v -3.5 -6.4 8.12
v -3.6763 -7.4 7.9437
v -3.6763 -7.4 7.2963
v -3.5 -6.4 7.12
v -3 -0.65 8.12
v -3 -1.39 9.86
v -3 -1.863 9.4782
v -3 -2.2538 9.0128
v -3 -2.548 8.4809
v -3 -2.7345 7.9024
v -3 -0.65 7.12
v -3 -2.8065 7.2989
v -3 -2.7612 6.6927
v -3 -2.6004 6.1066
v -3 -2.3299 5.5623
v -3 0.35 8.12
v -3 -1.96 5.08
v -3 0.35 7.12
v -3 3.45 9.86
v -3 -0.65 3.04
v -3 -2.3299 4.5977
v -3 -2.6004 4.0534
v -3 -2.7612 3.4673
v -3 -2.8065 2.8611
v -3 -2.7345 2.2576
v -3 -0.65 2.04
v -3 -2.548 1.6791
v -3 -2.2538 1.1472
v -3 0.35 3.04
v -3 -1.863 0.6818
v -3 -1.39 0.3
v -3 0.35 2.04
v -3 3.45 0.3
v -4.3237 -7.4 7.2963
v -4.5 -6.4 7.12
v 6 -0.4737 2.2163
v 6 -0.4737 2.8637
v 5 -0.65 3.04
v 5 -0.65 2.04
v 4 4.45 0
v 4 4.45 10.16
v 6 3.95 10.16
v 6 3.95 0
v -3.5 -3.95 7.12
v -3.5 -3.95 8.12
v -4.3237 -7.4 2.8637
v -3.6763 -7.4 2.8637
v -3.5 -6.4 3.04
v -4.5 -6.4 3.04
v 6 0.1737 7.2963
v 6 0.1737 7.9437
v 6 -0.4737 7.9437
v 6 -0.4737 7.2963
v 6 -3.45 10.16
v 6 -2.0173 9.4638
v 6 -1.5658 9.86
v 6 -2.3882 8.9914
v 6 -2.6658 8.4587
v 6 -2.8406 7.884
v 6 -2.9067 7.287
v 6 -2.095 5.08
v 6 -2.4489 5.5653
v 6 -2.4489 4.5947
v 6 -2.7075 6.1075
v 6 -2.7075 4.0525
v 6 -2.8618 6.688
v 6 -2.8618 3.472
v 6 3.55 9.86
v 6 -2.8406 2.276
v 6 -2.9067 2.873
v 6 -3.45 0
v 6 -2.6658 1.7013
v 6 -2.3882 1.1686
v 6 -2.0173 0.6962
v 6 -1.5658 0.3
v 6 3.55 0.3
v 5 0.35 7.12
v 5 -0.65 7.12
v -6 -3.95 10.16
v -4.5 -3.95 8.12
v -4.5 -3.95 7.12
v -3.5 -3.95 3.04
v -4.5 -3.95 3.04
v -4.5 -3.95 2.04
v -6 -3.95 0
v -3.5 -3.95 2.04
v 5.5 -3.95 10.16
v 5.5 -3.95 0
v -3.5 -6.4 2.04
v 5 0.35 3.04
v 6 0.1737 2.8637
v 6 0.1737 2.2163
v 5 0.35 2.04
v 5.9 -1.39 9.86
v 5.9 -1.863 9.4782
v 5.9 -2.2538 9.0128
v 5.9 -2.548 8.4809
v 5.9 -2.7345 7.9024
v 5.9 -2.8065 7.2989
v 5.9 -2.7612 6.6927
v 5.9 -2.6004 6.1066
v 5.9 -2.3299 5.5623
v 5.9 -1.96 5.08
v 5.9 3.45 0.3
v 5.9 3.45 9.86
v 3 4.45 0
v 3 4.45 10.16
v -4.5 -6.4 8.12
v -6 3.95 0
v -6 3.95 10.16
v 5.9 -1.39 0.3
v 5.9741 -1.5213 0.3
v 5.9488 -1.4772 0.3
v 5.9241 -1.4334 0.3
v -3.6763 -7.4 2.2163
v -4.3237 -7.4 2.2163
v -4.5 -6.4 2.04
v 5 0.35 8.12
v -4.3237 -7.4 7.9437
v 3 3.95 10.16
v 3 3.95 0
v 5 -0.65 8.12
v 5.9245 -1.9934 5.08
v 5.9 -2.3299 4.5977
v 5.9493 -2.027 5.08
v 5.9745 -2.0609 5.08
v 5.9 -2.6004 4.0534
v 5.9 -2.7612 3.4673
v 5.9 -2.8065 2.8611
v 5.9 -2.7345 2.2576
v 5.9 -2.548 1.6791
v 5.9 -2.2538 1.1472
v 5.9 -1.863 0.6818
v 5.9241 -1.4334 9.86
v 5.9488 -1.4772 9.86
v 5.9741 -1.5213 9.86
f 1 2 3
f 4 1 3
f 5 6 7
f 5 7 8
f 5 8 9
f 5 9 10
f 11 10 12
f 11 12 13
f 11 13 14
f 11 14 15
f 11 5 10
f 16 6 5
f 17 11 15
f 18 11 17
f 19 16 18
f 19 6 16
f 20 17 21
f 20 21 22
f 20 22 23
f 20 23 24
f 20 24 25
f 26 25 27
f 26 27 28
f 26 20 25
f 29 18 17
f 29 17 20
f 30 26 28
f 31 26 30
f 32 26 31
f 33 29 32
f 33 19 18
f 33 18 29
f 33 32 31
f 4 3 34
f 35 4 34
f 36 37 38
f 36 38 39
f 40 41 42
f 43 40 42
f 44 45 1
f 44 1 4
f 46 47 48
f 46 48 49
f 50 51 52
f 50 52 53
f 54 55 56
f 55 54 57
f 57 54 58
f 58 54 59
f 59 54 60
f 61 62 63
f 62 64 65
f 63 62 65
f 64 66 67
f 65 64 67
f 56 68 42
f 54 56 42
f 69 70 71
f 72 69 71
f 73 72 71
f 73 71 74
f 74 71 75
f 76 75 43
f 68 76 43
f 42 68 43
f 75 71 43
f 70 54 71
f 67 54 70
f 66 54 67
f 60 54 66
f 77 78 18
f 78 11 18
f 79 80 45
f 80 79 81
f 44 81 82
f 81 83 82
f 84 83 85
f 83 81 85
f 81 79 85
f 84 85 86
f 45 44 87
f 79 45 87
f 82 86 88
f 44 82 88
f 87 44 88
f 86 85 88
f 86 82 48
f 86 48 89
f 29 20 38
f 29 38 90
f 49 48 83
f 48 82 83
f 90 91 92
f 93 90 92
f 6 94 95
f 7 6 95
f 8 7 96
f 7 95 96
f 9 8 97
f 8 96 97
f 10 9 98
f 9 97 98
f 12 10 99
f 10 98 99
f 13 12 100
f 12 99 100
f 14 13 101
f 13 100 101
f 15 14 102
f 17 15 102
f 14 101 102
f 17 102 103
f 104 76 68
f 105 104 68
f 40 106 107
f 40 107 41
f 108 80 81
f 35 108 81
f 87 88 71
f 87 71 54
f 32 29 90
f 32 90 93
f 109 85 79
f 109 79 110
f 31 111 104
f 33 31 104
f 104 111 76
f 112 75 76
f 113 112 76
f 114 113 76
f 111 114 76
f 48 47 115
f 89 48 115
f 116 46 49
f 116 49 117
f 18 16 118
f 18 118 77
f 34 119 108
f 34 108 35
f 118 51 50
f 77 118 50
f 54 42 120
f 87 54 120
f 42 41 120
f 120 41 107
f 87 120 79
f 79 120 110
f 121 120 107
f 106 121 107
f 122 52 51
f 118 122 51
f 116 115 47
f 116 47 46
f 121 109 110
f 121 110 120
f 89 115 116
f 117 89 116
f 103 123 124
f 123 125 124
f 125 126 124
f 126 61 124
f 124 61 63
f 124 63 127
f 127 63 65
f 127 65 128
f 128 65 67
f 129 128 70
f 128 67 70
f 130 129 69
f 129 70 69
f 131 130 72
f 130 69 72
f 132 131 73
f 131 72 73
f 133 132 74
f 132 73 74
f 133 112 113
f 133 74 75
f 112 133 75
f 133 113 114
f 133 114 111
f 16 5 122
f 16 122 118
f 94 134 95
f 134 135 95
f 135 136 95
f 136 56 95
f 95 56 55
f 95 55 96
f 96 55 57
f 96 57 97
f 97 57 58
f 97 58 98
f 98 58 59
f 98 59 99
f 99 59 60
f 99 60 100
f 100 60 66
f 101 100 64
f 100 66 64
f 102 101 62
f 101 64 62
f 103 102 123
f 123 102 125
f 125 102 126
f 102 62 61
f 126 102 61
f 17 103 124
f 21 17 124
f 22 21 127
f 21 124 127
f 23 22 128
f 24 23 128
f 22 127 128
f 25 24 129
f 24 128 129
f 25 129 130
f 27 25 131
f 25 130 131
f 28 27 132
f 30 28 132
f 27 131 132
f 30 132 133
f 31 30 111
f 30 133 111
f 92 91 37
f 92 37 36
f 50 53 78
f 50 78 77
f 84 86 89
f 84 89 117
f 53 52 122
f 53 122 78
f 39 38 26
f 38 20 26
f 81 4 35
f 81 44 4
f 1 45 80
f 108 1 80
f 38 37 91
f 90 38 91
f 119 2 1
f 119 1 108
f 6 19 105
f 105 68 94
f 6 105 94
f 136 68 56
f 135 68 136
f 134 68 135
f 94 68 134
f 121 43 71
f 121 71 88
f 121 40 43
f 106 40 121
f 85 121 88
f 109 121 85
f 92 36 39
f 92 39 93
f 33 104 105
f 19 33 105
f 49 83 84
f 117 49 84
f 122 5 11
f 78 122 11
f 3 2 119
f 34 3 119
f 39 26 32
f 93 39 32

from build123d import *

# Parameters (mm, degrees)
SKIZZE3_W                       = 12
SKIZZE3_H                       = 7.9
AUFSATZ_LINEAR_AUSTRAGEN2_DEPTH = 10.16
AUFSATZ_LINEAR_AUSTRAGEN3_DEPTH = 10.16
SCHNITT_LINEAR_AUSTRAGEN1_DEPTH = 9
SKIZZE6_W                       = 1
SKIZZE6_H                       = 1
AUFSATZ_LINEAR_AUSTRAGEN4_DEPTH = 3.45
SKIZZE7_W                       = 1
SKIZZE7_H                       = 1
AUFSATZ_LINEAR_AUSTRAGEN5_DEPTH = 9
FASE1_SIZE                      = 1
FASE1_SIZE2                     = 0.176326981
FASE1_PART_2_SIZE               = 1
FASE1_PART_2_SIZE2              = 0.176326981
FASE1_PART_3_SIZE               = 1
FASE1_PART_3_SIZE2              = 0.176326981
FASE1_PART_4_SIZE               = 1
FASE1_PART_4_SIZE2              = 0.176326981
FASE1_PART_5_SIZE               = 1
FASE1_PART_5_SIZE2              = 0.176326981
FASE1_PART_6_SIZE               = 1
FASE1_PART_6_SIZE2              = 0.176326981
FASE1_PART_7_SIZE               = 1
FASE1_PART_7_SIZE2              = 0.176326981
FASE1_PART_8_SIZE               = 1
FASE1_PART_8_SIZE2              = 0.176326981
FASE14_SIZE                     = 1
FASE14_SIZE2                    = 0.176326981
FASE14_PART_2_SIZE              = 1
FASE14_PART_2_SIZE2             = 0.176326981
FASE14_PART_3_SIZE              = 1
FASE14_PART_3_SIZE2             = 0.176326981
FASE14_PART_4_SIZE              = 1
FASE14_PART_4_SIZE2             = 0.176326981
FASE14_PART_5_SIZE              = 1
FASE14_PART_5_SIZE2             = 0.176326981
FASE14_PART_6_SIZE              = 1
FASE14_PART_6_SIZE2             = 0.176326981
FASE14_PART_7_SIZE              = 1
FASE14_PART_7_SIZE2             = 0.176326981
FASE14_PART_8_SIZE              = 1
FASE14_PART_8_SIZE2             = 0.176326981
FASE15_SIZE                     = 0.1
FASE16_SIZE                     = 0.5


with BuildPart() as part:
    # Skizze3 → Aufsatz-Linear austragen2 (new body)
    with BuildSketch(Plane.XY):
        Rectangle(SKIZZE3_W, SKIZZE3_H)
    extrude(amount=AUFSATZ_LINEAR_AUSTRAGEN2_DEPTH)

    # Skizze4 → Aufsatz-Linear austragen3 (add, through all)
    with BuildSketch(Plane.XY.offset(10.16)):
        Polygon((3, 3.95), (3, 4.45), (4, 4.45), (6, 3.95), align=None)
    extrude(amount=-AUFSATZ_LINEAR_AUSTRAGEN3_DEPTH)

    # Skizze5 → Schnitt-Linear austragen1 (cut)
    with BuildSketch(Plane(origin=(6, 0, 0), x_dir=(0, 0, -1), z_dir=(1, 0, 0))):
        with BuildLine():
            Line((-9.86, 3.45), (-9.86, -1.39))
            ThreePointArc((-9.86, -1.39), (-7.602375704, -2.785098012), (-5.08, -1.96))
            ThreePointArc((-5.08, -1.96), (-2.557624296, -2.785098012), (-0.3, -1.39))
            Line((-0.3, -1.39), (-0.3, 3.45))
            Line((-0.3, 3.45), (-9.86, 3.45))
        make_face()
    extrude(amount=-SCHNITT_LINEAR_AUSTRAGEN1_DEPTH, mode=Mode.SUBTRACT)

    # Skizze6 → Aufsatz-Linear austragen4 (add)
    with BuildSketch(Plane(origin=(0, -3.95, 0), x_dir=(-1, 0, 0), z_dir=(0, -1, 0))):
        with Locations((4, -7.62)):
            Rectangle(SKIZZE6_W, SKIZZE6_H)
        with Locations((4, -2.54)):
            Rectangle(SKIZZE6_W, SKIZZE6_H)
    extrude(amount=AUFSATZ_LINEAR_AUSTRAGEN4_DEPTH)

    # Skizze7 → Aufsatz-Linear austragen5 (add)
    with BuildSketch(Plane(origin=(-3, 0, 0), x_dir=(0, 0, -1), z_dir=(1, 0, 0))):
        with Locations((-7.62, -0.15)):
            Rectangle(SKIZZE7_W, SKIZZE7_H)
        with Locations((-2.54, -0.15)):
            Rectangle(SKIZZE7_W, SKIZZE7_H)
    extrude(amount=AUFSATZ_LINEAR_AUSTRAGEN5_DEPTH)

    # Fase1
    fase1_edges = [part.edges().sort_by_distance(p)[0] for p in [
        (-3.5, -7.4, 7.62),
    ]]
    fase1_side = [part.faces().sort_by_distance(p)[0] for p in [
        (-3.5, -5.675, 7.62),
    ]]
    chamfer(fase1_edges, length=FASE1_SIZE, length2=FASE1_SIZE2, reference=fase1_side[0])

    # Fase1 part 2
    fase1_part_2_edges = [part.edges().sort_by_distance(p)[0] for p in [
        (-4, -7.4, 8.12),
    ]]
    fase1_part_2_side = [part.faces().sort_by_distance(p)[0] for p in [
        (-4, -5.675, 8.12),
    ]]
    chamfer(fase1_part_2_edges, length=FASE1_PART_2_SIZE, length2=FASE1_PART_2_SIZE2, reference=fase1_part_2_side[0])

    # Fase1 part 3
    fase1_part_3_edges = [part.edges().sort_by_distance(p)[0] for p in [
        (-4.5, -7.4, 7.62),
    ]]
    fase1_part_3_side = [part.faces().sort_by_distance(p)[0] for p in [
        (-4.5, -5.675, 7.62),
    ]]
    chamfer(fase1_part_3_edges, length=FASE1_PART_3_SIZE, length2=FASE1_PART_3_SIZE2, reference=fase1_part_3_side[0])

    # Fase1 part 4
    fase1_part_4_edges = [part.edges().sort_by_distance(p)[0] for p in [
        (-4, -7.4, 7.12),
    ]]
    fase1_part_4_side = [part.faces().sort_by_distance(p)[0] for p in [
        (-4, -5.675, 7.12),
    ]]
    chamfer(fase1_part_4_edges, length=FASE1_PART_4_SIZE, length2=FASE1_PART_4_SIZE2, reference=fase1_part_4_side[0])

    # Fase1 part 5
    fase1_part_5_edges = [part.edges().sort_by_distance(p)[0] for p in [
        (-4.5, -7.4, 2.54),
    ]]
    fase1_part_5_side = [part.faces().sort_by_distance(p)[0] for p in [
        (-4.5, -5.675, 2.54),
    ]]
    chamfer(fase1_part_5_edges, length=FASE1_PART_5_SIZE, length2=FASE1_PART_5_SIZE2, reference=fase1_part_5_side[0])

    # Fase1 part 6
    fase1_part_6_edges = [part.edges().sort_by_distance(p)[0] for p in [
        (-4, -7.4, 2.04),
    ]]
    fase1_part_6_side = [part.faces().sort_by_distance(p)[0] for p in [
        (-4, -5.675, 2.04),
    ]]
    chamfer(fase1_part_6_edges, length=FASE1_PART_6_SIZE, length2=FASE1_PART_6_SIZE2, reference=fase1_part_6_side[0])

    # Fase1 part 7
    fase1_part_7_edges = [part.edges().sort_by_distance(p)[0] for p in [
        (-3.5, -7.4, 2.54),
    ]]
    fase1_part_7_side = [part.faces().sort_by_distance(p)[0] for p in [
        (-3.5, -5.675, 2.54),
    ]]
    chamfer(fase1_part_7_edges, length=FASE1_PART_7_SIZE, length2=FASE1_PART_7_SIZE2, reference=fase1_part_7_side[0])

    # Fase1 part 8
    fase1_part_8_edges = [part.edges().sort_by_distance(p)[0] for p in [
        (-4, -7.4, 3.04),
    ]]
    fase1_part_8_side = [part.faces().sort_by_distance(p)[0] for p in [
        (-4, -5.675, 3.04),
    ]]
    chamfer(fase1_part_8_edges, length=FASE1_PART_8_SIZE, length2=FASE1_PART_8_SIZE2, reference=fase1_part_8_side[0])

    # Fase14
    fase14_edges = [part.edges().sort_by_distance(p)[0] for p in [
        (6, -0.65, 7.62),
    ]]
    fase14_side = [part.faces().sort_by_distance(p)[0] for p in [
        (1.5, -0.65, 7.62),
    ]]
    chamfer(fase14_edges, length=FASE14_SIZE, length2=FASE14_SIZE2, reference=fase14_side[0])

    # Fase14 part 2
    fase14_part_2_edges = [part.edges().sort_by_distance(p)[0] for p in [
        (6, -0.15, 8.12),
    ]]
    fase14_part_2_side = [part.faces().sort_by_distance(p)[0] for p in [
        (1.5, -0.15, 8.12),
    ]]
    chamfer(fase14_part_2_edges, length=FASE14_PART_2_SIZE, length2=FASE14_PART_2_SIZE2, reference=fase14_part_2_side[0])

    # Fase14 part 3
    fase14_part_3_edges = [part.edges().sort_by_distance(p)[0] for p in [
        (6, 0.35, 7.62),
    ]]
    fase14_part_3_side = [part.faces().sort_by_distance(p)[0] for p in [
        (1.5, 0.35, 7.62),
    ]]
    chamfer(fase14_part_3_edges, length=FASE14_PART_3_SIZE, length2=FASE14_PART_3_SIZE2, reference=fase14_part_3_side[0])

    # Fase14 part 4
    fase14_part_4_edges = [part.edges().sort_by_distance(p)[0] for p in [
        (6, -0.15, 7.12),
    ]]
    fase14_part_4_side = [part.faces().sort_by_distance(p)[0] for p in [
        (1.5, -0.15, 7.12),
    ]]
    chamfer(fase14_part_4_edges, length=FASE14_PART_4_SIZE, length2=FASE14_PART_4_SIZE2, reference=fase14_part_4_side[0])

    # Fase14 part 5
    fase14_part_5_edges = [part.edges().sort_by_distance(p)[0] for p in [
        (6, -0.15, 3.04),
    ]]
    fase14_part_5_side = [part.faces().sort_by_distance(p)[0] for p in [
        (1.5, -0.15, 3.04),
    ]]
    chamfer(fase14_part_5_edges, length=FASE14_PART_5_SIZE, length2=FASE14_PART_5_SIZE2, reference=fase14_part_5_side[0])

    # Fase14 part 6
    fase14_part_6_edges = [part.edges().sort_by_distance(p)[0] for p in [
        (6, 0.35, 2.54),
    ]]
    fase14_part_6_side = [part.faces().sort_by_distance(p)[0] for p in [
        (1.5, 0.35, 2.54),
    ]]
    chamfer(fase14_part_6_edges, length=FASE14_PART_6_SIZE, length2=FASE14_PART_6_SIZE2, reference=fase14_part_6_side[0])

    # Fase14 part 7
    fase14_part_7_edges = [part.edges().sort_by_distance(p)[0] for p in [
        (6, -0.15, 2.04),
    ]]
    fase14_part_7_side = [part.faces().sort_by_distance(p)[0] for p in [
        (1.5, -0.15, 2.04),
    ]]
    chamfer(fase14_part_7_edges, length=FASE14_PART_7_SIZE, length2=FASE14_PART_7_SIZE2, reference=fase14_part_7_side[0])

    # Fase14 part 8
    fase14_part_8_edges = [part.edges().sort_by_distance(p)[0] for p in [
        (6, -0.65, 2.54),
    ]]
    fase14_part_8_side = [part.faces().sort_by_distance(p)[0] for p in [
        (1.5, -0.65, 2.54),
    ]]
    chamfer(fase14_part_8_edges, length=FASE14_PART_8_SIZE, length2=FASE14_PART_8_SIZE2, reference=fase14_part_8_side[0])

    # Fase15
    fase15_edges = [part.edges().sort_by_distance(p)[0] for p in [
        (6, 3.45, 5.08),
        (6, -2.785098012, 7.602375704),
        (6, -2.785098012, 2.557624296),
    ]]
    chamfer(fase15_edges, length=FASE15_SIZE)

    # Fase16
    fase16_edges = [part.edges().sort_by_distance(p)[0] for p in [
        (6, -3.95, 5.08),
    ]]
    chamfer(fase16_edges, length=FASE16_SIZE)


solid = part.part
